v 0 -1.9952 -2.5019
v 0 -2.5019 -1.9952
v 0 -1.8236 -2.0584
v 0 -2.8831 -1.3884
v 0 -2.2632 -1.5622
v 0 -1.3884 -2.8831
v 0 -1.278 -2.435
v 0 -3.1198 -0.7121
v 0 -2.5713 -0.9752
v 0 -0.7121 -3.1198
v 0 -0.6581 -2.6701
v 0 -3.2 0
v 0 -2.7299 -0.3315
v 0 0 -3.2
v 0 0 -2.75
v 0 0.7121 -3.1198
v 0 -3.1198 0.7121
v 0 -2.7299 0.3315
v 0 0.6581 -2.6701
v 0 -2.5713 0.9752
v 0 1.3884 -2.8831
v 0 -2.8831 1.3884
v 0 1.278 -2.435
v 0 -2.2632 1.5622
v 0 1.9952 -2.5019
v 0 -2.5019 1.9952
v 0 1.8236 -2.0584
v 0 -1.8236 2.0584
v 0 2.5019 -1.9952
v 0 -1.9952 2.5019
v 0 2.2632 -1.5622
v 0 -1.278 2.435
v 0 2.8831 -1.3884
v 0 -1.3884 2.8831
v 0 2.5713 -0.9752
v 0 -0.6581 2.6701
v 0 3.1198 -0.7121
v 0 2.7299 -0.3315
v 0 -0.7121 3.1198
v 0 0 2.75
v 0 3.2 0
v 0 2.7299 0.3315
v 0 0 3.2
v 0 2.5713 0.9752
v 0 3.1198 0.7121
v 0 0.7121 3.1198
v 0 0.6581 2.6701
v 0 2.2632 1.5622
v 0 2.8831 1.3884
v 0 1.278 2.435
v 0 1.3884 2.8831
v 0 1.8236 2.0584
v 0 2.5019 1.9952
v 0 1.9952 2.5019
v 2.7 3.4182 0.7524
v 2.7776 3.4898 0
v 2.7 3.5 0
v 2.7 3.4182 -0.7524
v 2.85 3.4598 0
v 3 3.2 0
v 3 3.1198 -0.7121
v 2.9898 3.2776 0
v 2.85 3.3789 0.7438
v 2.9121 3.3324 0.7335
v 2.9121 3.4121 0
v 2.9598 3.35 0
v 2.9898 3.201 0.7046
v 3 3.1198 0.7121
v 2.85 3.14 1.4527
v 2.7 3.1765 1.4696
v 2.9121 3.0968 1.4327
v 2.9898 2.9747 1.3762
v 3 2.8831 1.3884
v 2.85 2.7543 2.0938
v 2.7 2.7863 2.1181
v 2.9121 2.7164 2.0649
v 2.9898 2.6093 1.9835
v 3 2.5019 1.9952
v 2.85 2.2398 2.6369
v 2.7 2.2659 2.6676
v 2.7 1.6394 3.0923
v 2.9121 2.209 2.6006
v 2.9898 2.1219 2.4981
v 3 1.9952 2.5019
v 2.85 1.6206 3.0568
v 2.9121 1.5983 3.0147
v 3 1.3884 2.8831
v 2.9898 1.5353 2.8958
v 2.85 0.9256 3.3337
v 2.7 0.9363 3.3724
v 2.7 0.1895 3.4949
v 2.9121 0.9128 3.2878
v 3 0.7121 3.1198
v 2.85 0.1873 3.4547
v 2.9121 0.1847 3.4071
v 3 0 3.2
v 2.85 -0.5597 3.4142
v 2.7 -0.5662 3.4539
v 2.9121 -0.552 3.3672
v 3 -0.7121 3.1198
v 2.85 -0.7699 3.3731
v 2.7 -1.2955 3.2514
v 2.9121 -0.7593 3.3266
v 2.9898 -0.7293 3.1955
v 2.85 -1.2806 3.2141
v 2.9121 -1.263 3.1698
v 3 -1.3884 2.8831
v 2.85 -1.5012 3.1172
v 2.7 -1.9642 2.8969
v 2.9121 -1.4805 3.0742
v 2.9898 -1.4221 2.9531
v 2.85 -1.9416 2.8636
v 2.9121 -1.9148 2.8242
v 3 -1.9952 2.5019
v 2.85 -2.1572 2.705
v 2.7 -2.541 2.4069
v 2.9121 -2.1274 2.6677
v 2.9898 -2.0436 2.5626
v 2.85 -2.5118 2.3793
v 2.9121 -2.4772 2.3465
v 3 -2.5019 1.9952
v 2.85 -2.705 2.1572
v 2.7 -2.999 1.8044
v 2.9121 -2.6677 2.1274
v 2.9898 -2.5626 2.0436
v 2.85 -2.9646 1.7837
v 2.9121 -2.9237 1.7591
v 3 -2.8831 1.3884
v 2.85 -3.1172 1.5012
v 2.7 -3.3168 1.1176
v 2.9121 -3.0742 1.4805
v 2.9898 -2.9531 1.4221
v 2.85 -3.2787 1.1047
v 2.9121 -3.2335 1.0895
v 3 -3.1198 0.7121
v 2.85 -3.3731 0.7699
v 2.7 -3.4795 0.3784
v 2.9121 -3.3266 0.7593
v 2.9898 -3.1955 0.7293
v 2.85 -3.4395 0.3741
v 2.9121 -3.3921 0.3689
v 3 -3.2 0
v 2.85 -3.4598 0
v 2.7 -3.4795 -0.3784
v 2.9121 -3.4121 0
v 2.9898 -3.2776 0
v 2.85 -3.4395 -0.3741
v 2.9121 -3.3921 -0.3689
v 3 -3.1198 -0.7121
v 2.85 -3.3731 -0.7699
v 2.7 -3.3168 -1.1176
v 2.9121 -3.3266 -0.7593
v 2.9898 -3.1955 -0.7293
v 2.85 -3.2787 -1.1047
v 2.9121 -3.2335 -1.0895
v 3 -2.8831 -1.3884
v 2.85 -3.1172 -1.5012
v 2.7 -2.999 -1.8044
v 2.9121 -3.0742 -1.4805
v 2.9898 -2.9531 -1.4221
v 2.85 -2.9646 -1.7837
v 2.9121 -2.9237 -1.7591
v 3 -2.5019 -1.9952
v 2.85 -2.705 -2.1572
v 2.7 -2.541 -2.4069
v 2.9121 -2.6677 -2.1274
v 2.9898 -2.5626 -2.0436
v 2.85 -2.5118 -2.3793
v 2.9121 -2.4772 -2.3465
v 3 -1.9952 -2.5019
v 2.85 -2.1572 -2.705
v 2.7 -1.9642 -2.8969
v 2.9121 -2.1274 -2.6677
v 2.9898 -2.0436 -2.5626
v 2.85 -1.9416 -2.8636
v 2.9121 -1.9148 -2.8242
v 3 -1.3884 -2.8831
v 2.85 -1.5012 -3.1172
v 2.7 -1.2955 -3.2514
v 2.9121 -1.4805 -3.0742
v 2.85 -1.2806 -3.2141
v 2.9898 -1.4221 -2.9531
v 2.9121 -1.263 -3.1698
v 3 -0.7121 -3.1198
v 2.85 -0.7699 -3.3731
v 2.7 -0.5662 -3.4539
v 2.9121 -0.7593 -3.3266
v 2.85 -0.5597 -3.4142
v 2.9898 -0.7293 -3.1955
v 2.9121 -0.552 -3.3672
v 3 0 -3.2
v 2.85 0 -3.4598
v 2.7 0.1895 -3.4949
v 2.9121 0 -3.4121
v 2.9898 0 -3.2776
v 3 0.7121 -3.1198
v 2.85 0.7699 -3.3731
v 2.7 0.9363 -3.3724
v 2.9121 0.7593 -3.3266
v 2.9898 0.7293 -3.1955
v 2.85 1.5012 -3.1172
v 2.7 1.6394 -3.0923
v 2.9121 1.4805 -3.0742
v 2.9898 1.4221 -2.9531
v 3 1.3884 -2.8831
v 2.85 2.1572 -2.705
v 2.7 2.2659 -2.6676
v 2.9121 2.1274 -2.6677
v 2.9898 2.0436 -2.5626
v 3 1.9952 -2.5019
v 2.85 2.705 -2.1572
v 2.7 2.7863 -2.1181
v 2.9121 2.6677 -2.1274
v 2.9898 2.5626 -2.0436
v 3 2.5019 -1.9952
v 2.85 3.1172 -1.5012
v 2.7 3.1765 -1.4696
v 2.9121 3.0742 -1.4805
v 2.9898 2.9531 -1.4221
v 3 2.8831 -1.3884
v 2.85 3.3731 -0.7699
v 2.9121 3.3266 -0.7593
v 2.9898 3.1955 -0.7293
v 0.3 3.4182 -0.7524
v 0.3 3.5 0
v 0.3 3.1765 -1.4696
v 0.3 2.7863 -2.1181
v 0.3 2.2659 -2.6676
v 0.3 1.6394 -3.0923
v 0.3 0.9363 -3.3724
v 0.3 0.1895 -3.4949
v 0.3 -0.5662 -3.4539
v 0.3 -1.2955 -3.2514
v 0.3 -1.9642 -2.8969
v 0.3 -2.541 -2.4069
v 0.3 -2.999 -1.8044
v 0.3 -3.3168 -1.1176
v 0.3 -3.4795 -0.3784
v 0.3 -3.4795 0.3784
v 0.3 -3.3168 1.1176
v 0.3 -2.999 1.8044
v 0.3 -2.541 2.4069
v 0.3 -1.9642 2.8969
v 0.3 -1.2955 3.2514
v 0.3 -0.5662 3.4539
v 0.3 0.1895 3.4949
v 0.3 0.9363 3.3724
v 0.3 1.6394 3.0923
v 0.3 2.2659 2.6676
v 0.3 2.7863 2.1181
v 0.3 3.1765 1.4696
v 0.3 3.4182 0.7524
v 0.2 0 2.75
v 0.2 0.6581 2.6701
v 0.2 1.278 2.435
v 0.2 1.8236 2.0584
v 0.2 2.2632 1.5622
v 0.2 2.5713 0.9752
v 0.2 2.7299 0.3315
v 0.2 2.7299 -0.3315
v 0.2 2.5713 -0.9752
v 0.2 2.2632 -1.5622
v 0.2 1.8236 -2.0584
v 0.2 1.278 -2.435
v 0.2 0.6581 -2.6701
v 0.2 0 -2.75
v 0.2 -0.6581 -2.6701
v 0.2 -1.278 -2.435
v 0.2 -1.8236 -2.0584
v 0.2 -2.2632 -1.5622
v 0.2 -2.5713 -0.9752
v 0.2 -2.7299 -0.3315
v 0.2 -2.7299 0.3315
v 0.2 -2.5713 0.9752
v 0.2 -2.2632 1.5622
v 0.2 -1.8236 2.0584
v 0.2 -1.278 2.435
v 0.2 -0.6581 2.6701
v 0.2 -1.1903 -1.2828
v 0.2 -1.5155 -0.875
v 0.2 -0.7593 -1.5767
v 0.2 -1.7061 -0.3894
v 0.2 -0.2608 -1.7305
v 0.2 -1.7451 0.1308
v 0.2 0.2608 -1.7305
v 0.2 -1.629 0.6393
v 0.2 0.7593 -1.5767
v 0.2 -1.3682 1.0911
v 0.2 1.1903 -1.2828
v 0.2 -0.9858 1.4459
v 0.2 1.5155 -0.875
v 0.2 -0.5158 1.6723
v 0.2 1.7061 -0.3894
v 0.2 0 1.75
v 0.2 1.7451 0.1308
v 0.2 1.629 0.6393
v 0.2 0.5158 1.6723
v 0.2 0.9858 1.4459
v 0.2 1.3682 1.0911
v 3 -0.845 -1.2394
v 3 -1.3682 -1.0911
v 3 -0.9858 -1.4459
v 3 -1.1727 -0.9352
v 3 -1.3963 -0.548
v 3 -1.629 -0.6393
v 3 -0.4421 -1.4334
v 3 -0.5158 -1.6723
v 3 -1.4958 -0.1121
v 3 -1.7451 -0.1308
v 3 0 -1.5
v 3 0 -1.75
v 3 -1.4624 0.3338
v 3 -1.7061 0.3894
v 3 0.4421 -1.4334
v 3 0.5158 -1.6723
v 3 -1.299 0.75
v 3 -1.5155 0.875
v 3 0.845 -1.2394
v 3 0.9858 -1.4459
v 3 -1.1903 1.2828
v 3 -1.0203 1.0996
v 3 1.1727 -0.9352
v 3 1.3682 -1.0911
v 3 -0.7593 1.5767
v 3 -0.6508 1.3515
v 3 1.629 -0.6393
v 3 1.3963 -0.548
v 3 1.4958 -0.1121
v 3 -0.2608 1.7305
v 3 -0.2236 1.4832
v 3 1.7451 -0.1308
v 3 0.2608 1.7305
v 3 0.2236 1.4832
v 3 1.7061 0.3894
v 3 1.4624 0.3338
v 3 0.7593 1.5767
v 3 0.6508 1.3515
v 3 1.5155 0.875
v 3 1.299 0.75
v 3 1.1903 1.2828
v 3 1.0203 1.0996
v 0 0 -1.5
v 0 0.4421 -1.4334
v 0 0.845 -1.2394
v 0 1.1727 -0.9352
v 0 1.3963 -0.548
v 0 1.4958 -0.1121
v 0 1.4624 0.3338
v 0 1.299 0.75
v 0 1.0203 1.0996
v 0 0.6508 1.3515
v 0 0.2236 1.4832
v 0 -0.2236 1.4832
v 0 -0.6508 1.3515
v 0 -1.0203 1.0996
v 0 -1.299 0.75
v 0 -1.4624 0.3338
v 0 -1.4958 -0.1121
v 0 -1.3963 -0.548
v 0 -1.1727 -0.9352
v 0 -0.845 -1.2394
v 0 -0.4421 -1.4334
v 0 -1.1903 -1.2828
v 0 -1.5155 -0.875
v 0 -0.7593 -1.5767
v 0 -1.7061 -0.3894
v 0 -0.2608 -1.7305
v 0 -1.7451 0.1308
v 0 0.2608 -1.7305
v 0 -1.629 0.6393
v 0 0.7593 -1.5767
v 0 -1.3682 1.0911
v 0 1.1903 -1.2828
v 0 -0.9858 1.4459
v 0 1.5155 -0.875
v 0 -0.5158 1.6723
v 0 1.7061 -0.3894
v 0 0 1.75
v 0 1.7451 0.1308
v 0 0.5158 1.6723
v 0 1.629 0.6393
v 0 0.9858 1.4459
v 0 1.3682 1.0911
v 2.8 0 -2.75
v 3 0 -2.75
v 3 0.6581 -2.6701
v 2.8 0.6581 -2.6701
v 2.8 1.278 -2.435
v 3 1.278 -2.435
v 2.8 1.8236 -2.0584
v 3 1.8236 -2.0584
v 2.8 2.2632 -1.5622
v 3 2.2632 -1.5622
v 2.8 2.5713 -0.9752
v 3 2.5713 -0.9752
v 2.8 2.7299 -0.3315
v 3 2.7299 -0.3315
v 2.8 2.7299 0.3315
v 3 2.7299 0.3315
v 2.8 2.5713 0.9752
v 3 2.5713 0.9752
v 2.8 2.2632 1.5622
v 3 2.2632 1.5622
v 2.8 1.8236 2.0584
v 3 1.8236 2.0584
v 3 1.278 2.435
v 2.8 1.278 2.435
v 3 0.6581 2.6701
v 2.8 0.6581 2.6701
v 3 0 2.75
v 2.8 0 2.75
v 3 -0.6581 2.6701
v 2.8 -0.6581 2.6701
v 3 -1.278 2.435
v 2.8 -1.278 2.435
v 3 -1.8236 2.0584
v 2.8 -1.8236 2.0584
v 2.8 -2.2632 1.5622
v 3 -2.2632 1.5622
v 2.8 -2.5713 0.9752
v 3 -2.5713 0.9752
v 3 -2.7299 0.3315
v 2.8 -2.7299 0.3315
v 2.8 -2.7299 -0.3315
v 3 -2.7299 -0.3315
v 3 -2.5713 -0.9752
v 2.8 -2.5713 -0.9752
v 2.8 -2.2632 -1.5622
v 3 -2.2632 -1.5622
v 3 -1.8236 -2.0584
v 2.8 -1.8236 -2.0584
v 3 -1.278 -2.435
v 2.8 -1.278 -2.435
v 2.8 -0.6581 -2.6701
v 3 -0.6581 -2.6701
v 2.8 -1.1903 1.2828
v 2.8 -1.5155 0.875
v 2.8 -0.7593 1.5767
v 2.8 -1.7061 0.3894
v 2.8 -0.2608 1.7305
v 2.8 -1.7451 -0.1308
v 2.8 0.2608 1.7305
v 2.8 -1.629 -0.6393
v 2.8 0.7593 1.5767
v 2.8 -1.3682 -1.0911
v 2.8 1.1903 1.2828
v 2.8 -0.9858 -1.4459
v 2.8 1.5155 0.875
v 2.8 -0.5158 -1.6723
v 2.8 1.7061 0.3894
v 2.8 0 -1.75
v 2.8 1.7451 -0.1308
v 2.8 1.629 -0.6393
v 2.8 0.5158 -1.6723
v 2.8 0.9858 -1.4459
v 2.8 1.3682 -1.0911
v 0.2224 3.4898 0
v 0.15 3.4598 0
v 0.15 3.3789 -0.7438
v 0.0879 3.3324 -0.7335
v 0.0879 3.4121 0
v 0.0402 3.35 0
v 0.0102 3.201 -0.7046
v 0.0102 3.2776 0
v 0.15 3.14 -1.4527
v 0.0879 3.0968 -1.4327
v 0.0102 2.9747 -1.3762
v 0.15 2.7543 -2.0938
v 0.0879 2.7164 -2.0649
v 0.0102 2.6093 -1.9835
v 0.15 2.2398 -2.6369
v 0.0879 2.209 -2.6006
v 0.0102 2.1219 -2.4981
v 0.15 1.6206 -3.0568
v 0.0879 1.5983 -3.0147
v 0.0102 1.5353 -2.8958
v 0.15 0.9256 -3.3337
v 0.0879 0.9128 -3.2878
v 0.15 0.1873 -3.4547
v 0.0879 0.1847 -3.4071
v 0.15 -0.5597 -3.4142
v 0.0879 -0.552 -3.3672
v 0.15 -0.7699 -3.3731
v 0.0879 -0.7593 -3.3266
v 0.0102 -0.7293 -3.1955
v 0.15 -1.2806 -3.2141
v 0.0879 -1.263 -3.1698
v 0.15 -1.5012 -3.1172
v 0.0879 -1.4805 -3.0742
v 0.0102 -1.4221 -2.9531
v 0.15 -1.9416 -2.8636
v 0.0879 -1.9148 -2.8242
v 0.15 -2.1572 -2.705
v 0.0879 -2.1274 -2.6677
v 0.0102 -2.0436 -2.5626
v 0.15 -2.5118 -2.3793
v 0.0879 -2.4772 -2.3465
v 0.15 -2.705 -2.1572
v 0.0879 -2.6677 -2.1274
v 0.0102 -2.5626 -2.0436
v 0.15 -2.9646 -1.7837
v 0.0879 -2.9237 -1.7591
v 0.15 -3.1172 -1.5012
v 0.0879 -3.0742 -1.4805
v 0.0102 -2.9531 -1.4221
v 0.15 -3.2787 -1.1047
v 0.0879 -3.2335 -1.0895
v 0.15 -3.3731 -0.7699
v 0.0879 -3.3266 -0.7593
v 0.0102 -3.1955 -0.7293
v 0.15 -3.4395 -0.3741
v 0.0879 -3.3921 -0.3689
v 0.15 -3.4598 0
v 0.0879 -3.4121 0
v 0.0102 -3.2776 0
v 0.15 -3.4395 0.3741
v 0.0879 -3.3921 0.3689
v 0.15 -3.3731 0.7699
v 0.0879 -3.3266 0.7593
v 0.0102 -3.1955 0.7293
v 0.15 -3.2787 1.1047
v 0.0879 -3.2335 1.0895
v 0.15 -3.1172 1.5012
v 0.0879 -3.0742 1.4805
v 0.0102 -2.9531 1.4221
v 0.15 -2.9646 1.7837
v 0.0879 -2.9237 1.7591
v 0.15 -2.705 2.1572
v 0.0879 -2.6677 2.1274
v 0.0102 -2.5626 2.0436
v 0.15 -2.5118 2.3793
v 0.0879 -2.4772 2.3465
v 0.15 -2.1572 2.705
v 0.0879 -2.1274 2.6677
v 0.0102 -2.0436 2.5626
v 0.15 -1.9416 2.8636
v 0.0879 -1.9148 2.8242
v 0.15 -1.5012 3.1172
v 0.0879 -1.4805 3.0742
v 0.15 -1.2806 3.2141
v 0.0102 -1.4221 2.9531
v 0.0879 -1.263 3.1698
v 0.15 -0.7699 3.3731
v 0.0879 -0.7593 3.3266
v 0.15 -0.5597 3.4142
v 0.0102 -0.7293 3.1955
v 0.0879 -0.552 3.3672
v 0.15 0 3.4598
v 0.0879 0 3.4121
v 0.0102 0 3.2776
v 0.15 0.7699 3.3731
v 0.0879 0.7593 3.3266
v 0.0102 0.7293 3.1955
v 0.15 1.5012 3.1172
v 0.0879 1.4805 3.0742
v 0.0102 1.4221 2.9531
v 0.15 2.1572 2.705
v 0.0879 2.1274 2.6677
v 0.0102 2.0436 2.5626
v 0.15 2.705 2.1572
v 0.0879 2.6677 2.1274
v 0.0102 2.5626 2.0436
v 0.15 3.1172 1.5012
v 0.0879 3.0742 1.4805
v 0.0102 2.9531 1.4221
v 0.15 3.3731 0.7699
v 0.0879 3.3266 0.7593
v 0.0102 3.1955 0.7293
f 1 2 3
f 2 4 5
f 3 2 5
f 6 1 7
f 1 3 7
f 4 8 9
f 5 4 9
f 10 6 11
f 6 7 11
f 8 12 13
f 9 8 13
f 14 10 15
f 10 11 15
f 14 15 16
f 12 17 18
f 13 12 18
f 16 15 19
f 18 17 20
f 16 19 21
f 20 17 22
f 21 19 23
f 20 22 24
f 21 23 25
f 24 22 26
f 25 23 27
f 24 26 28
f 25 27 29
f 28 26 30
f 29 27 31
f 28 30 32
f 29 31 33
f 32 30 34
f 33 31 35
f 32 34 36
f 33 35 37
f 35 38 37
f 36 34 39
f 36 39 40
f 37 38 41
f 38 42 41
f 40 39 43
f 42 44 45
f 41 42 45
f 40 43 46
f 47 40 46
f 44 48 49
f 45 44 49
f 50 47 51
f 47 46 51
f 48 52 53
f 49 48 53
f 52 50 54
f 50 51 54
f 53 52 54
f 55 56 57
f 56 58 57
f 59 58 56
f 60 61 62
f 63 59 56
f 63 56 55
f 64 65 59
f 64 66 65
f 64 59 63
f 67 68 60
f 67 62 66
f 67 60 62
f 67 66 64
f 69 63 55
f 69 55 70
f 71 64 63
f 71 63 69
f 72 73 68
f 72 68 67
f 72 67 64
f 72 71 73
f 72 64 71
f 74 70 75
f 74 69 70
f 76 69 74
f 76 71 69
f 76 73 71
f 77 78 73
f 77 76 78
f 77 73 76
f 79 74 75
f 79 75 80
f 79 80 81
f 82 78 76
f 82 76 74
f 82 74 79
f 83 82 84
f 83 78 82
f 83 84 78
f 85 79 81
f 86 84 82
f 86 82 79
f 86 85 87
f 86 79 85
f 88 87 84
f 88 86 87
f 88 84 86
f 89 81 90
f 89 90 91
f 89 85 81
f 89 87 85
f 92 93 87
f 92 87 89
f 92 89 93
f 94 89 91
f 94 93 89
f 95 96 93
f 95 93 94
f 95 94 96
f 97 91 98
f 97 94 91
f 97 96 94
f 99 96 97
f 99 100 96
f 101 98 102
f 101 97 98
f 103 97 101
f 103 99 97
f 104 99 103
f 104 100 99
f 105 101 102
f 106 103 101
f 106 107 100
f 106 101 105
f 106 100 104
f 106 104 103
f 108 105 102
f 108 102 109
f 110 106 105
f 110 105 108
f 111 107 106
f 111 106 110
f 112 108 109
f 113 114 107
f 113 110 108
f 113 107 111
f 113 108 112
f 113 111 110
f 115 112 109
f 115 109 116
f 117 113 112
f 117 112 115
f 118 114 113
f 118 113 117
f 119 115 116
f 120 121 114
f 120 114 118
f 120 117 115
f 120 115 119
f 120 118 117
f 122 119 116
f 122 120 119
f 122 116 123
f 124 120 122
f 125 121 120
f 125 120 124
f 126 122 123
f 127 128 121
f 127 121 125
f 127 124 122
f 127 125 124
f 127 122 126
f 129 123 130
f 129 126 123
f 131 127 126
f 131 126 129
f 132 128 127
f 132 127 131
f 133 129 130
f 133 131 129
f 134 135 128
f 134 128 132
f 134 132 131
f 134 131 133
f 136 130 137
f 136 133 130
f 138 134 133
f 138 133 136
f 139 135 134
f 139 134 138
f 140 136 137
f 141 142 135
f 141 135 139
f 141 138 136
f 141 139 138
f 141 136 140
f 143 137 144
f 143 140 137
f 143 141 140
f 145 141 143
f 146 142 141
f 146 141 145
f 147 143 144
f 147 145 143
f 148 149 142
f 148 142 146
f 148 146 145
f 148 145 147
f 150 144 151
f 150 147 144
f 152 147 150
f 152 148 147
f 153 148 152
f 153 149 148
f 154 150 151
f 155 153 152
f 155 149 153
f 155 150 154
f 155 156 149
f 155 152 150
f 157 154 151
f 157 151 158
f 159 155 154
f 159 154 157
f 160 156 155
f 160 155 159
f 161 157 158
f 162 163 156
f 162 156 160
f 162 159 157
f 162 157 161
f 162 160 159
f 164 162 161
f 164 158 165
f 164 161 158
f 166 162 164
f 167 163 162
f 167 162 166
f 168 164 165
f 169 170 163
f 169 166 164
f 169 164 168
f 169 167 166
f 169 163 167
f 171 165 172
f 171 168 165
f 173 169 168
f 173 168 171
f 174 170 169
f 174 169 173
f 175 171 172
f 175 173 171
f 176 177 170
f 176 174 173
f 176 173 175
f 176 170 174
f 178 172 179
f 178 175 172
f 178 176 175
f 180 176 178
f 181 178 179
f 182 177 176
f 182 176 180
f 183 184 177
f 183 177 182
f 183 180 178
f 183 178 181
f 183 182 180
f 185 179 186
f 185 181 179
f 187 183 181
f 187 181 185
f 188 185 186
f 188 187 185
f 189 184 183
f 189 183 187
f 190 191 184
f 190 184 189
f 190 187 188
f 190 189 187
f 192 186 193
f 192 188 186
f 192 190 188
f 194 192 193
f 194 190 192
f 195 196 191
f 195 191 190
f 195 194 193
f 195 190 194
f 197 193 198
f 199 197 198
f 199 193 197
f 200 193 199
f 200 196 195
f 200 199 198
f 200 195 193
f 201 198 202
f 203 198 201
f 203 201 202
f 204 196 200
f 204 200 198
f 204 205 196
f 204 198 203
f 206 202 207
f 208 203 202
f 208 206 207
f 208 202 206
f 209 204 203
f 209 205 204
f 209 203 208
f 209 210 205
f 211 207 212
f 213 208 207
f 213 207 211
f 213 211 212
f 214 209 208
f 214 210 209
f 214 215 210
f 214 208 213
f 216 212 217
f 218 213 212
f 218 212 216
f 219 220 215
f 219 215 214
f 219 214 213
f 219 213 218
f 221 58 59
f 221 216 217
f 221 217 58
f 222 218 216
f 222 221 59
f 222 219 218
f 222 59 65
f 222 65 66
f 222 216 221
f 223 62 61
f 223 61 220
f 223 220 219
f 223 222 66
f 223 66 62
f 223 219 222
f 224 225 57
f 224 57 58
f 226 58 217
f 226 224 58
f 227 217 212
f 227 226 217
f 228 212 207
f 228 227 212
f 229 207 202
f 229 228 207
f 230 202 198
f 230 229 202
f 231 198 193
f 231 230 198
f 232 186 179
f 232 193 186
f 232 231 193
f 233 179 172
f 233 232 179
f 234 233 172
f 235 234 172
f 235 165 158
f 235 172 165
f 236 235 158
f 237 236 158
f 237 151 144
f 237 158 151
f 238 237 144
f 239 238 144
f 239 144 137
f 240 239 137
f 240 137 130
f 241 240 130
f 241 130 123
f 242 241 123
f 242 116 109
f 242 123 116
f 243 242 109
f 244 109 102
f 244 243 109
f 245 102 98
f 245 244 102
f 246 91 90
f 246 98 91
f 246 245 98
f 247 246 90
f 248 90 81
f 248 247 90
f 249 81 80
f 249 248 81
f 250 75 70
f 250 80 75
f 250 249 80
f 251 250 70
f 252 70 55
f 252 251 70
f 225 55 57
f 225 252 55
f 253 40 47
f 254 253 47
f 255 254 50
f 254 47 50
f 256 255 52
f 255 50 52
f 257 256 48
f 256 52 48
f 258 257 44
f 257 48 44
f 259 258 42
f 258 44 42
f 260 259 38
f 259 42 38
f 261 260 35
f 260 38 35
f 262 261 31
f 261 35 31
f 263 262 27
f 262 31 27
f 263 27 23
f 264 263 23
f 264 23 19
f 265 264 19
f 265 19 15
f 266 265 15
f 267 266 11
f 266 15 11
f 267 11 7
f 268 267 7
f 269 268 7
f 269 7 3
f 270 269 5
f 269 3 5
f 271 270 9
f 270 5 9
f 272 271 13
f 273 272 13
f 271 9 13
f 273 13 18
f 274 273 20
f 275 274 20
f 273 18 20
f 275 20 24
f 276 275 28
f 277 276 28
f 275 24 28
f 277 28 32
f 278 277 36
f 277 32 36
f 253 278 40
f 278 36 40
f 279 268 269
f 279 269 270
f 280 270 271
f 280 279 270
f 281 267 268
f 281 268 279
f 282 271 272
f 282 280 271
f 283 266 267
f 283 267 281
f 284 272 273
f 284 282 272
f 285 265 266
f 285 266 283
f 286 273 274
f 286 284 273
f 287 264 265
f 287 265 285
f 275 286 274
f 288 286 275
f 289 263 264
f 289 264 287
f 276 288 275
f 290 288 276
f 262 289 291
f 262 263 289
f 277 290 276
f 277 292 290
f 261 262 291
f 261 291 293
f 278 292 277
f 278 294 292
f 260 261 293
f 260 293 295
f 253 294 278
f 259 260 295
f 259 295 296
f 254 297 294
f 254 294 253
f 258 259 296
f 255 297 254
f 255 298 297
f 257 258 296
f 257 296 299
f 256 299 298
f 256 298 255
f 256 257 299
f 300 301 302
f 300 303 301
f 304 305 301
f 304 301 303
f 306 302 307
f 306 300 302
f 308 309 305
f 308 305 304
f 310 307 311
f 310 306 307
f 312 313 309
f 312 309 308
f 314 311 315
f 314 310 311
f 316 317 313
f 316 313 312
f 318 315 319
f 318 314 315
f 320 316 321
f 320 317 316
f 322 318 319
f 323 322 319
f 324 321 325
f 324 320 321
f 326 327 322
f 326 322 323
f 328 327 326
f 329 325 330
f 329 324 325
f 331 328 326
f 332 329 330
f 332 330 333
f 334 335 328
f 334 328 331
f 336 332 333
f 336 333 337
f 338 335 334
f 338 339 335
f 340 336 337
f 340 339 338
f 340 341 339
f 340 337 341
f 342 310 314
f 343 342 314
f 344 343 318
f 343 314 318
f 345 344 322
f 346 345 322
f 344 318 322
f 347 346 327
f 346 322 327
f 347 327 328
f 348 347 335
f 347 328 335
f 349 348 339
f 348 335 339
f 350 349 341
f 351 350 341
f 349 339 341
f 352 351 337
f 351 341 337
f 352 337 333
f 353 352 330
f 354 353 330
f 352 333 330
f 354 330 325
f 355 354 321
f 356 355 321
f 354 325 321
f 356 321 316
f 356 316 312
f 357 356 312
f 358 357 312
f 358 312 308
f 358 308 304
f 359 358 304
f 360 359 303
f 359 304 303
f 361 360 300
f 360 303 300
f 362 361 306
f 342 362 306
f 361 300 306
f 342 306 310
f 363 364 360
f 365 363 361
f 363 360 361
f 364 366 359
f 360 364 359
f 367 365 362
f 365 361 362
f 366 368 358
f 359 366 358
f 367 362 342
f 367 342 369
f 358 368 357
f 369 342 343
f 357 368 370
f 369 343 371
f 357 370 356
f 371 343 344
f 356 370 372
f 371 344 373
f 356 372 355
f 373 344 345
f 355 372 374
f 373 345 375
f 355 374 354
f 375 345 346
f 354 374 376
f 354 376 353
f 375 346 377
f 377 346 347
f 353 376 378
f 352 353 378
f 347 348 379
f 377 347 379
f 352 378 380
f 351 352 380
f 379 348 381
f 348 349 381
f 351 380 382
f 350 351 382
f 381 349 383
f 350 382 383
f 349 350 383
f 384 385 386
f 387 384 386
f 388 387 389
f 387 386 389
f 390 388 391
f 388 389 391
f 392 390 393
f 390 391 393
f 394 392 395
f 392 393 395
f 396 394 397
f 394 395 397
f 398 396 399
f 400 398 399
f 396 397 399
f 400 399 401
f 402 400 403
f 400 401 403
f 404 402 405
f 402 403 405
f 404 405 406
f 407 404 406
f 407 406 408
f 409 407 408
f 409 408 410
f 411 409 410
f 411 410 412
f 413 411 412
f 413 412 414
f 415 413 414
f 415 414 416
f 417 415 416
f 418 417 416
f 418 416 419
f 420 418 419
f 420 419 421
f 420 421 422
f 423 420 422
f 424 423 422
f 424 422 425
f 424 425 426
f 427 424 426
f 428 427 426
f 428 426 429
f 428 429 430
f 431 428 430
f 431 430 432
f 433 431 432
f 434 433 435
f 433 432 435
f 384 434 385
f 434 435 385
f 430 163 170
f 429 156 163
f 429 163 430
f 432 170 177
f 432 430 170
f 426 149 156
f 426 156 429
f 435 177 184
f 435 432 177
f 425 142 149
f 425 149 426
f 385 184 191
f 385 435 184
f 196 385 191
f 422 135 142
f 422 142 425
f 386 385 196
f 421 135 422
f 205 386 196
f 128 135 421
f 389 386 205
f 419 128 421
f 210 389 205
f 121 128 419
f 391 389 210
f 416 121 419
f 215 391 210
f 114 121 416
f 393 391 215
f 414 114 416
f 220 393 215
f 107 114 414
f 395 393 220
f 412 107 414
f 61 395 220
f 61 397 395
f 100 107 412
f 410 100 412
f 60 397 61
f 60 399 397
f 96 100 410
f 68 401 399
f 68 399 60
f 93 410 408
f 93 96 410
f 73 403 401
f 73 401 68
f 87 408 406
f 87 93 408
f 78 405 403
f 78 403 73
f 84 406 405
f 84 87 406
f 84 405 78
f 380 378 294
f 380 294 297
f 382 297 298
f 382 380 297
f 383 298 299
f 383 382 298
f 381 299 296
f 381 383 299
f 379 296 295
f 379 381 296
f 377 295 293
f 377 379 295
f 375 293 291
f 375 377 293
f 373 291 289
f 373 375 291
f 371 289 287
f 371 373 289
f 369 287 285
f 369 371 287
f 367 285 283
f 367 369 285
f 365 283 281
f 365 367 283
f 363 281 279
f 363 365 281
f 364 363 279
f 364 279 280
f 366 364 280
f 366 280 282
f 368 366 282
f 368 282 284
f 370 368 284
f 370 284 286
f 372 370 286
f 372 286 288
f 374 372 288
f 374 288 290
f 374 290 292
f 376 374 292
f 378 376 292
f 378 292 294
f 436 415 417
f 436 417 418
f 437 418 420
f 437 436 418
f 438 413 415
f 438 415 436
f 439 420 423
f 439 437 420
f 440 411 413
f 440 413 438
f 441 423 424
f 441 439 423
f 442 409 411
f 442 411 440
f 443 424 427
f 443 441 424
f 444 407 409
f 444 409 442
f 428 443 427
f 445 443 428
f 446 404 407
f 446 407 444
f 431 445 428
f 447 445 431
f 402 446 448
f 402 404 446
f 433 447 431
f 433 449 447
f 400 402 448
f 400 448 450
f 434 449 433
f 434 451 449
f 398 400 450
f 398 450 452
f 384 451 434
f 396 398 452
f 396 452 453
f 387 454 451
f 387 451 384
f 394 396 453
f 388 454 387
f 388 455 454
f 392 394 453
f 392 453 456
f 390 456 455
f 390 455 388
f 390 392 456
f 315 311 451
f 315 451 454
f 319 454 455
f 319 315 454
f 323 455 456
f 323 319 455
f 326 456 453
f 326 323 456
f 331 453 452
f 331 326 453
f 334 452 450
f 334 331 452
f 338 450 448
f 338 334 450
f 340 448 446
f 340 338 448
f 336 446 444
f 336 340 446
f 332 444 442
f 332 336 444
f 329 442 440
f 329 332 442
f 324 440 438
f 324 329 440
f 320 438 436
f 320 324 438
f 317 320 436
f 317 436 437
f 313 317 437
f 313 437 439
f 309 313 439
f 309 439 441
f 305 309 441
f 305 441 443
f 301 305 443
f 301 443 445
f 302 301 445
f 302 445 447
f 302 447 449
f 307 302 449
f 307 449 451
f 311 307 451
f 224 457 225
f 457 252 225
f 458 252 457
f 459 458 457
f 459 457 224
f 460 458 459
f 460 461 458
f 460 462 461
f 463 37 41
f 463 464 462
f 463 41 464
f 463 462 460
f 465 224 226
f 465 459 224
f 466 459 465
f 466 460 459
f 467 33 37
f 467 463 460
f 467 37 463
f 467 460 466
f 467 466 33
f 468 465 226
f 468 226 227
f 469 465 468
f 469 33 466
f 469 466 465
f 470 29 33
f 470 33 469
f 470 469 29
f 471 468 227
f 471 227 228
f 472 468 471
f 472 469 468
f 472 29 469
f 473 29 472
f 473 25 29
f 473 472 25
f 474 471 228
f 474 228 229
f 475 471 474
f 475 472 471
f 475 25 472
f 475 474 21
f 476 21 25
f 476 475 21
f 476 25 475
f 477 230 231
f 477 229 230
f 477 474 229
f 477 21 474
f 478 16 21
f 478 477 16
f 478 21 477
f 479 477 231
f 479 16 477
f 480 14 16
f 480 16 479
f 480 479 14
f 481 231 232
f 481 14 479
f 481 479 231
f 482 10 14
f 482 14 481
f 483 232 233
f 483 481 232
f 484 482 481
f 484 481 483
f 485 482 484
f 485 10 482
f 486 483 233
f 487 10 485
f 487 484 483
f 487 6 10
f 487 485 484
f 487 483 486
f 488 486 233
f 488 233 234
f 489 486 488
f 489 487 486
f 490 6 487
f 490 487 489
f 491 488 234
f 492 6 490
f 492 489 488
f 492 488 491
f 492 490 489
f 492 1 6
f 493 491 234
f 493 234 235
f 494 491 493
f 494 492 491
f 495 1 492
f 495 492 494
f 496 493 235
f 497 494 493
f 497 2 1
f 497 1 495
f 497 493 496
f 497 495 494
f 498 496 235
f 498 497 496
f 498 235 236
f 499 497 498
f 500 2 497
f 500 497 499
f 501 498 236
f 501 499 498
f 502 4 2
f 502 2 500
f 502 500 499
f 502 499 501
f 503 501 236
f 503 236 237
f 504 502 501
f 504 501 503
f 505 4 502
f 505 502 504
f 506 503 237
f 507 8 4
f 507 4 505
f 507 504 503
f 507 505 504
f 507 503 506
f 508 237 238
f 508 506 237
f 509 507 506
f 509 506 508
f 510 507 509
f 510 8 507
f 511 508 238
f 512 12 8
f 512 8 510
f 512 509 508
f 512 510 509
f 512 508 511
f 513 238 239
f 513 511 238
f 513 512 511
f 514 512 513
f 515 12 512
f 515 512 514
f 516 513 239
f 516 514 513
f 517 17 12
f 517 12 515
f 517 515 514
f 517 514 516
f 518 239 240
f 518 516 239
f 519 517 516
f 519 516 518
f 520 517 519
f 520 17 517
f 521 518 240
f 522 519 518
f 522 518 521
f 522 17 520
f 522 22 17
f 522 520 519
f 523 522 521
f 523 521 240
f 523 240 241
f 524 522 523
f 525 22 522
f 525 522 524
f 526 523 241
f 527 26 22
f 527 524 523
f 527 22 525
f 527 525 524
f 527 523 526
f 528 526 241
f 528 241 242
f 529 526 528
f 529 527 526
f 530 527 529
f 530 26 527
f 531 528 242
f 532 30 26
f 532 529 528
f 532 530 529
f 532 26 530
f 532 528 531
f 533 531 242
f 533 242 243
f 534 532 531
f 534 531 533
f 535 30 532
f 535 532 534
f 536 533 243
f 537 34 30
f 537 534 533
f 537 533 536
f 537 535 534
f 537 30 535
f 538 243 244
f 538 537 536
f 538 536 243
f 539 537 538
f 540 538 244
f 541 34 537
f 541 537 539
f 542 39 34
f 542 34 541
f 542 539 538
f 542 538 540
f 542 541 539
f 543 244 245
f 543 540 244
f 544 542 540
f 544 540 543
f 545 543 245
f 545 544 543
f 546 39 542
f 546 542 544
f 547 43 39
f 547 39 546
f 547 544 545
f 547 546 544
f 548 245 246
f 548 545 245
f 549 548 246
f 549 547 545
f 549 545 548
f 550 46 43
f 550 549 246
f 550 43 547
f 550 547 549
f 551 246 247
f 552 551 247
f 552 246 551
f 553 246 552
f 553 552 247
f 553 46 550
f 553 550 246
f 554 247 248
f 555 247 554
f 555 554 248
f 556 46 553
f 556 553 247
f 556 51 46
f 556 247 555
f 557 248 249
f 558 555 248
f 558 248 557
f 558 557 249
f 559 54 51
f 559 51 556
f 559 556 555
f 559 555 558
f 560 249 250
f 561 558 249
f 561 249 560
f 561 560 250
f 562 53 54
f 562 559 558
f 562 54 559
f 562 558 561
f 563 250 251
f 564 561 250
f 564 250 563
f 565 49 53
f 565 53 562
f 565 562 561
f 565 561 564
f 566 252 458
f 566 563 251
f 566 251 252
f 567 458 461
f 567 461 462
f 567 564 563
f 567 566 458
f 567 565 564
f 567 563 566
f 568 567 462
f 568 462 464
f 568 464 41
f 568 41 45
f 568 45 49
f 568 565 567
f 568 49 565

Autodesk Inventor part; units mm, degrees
ref_plane "YZ Plane" through (0, 0, 0) normal (1, 0, 0) x (0, 1, 0)
ref_plane "XZ Plane" through (0, 0, 0) normal (0, 1, 0) x (-1, 0, 0)
ref_plane "XY Plane" through (0, 0, 0) normal (0, 0, 1) x (1, 0, 0)
sketch "スケッチ1" plane through (0, 0, 0) normal (1, 0, 0) x (0, 1, 0)
  circle A0 centre (0, 0) radius 3.5
  dimension "d0" = 7
extrude "押し出し1" add sketch "スケッチ1" along normal blind 3
sketch "スケッチ2" plane through (3, 0, 0) normal (1, 0, 0) x (0, 0, -1)
  circle A0 centre (0, 0) radius 1.5
  dimension "d3" = 3
extrude "押し出し2" cut sketch "スケッチ2" against normal blind 3
sketch "スケッチ3" plane through (3, 0, 0) normal (1, 0, 0) x (0, 0, -1)
  circle A0 centre (0, 0) radius 1.75
  circle A1 centre (0, 0) radius 2.75
  dimension "d6" = 3.5
  dimension "d7" = 5.5
extrude "押し出し3" cut sketch "スケッチ3" against normal blind 0.2
sketch "スケッチ4" plane through (0, 0, 0) normal (-1, 0, 0) x (0, 0, 1)
  circle A0 centre (0, 0) radius 1.75
  circle A1 centre (0, 0) radius 2.75
  dimension "d10" = 3.5
  dimension "d11" = 5.5
extrude "押し出し4" cut sketch "スケッチ4" against normal blind 0.2
fillet "フィレット1" radius 0.3 1 edges at (3, -3.5, 0)
fillet "フィレット2" radius 0.3 1 edges at (0, -3.5, 0)
properties part number "d7_bearing" material "鋼、合金"
